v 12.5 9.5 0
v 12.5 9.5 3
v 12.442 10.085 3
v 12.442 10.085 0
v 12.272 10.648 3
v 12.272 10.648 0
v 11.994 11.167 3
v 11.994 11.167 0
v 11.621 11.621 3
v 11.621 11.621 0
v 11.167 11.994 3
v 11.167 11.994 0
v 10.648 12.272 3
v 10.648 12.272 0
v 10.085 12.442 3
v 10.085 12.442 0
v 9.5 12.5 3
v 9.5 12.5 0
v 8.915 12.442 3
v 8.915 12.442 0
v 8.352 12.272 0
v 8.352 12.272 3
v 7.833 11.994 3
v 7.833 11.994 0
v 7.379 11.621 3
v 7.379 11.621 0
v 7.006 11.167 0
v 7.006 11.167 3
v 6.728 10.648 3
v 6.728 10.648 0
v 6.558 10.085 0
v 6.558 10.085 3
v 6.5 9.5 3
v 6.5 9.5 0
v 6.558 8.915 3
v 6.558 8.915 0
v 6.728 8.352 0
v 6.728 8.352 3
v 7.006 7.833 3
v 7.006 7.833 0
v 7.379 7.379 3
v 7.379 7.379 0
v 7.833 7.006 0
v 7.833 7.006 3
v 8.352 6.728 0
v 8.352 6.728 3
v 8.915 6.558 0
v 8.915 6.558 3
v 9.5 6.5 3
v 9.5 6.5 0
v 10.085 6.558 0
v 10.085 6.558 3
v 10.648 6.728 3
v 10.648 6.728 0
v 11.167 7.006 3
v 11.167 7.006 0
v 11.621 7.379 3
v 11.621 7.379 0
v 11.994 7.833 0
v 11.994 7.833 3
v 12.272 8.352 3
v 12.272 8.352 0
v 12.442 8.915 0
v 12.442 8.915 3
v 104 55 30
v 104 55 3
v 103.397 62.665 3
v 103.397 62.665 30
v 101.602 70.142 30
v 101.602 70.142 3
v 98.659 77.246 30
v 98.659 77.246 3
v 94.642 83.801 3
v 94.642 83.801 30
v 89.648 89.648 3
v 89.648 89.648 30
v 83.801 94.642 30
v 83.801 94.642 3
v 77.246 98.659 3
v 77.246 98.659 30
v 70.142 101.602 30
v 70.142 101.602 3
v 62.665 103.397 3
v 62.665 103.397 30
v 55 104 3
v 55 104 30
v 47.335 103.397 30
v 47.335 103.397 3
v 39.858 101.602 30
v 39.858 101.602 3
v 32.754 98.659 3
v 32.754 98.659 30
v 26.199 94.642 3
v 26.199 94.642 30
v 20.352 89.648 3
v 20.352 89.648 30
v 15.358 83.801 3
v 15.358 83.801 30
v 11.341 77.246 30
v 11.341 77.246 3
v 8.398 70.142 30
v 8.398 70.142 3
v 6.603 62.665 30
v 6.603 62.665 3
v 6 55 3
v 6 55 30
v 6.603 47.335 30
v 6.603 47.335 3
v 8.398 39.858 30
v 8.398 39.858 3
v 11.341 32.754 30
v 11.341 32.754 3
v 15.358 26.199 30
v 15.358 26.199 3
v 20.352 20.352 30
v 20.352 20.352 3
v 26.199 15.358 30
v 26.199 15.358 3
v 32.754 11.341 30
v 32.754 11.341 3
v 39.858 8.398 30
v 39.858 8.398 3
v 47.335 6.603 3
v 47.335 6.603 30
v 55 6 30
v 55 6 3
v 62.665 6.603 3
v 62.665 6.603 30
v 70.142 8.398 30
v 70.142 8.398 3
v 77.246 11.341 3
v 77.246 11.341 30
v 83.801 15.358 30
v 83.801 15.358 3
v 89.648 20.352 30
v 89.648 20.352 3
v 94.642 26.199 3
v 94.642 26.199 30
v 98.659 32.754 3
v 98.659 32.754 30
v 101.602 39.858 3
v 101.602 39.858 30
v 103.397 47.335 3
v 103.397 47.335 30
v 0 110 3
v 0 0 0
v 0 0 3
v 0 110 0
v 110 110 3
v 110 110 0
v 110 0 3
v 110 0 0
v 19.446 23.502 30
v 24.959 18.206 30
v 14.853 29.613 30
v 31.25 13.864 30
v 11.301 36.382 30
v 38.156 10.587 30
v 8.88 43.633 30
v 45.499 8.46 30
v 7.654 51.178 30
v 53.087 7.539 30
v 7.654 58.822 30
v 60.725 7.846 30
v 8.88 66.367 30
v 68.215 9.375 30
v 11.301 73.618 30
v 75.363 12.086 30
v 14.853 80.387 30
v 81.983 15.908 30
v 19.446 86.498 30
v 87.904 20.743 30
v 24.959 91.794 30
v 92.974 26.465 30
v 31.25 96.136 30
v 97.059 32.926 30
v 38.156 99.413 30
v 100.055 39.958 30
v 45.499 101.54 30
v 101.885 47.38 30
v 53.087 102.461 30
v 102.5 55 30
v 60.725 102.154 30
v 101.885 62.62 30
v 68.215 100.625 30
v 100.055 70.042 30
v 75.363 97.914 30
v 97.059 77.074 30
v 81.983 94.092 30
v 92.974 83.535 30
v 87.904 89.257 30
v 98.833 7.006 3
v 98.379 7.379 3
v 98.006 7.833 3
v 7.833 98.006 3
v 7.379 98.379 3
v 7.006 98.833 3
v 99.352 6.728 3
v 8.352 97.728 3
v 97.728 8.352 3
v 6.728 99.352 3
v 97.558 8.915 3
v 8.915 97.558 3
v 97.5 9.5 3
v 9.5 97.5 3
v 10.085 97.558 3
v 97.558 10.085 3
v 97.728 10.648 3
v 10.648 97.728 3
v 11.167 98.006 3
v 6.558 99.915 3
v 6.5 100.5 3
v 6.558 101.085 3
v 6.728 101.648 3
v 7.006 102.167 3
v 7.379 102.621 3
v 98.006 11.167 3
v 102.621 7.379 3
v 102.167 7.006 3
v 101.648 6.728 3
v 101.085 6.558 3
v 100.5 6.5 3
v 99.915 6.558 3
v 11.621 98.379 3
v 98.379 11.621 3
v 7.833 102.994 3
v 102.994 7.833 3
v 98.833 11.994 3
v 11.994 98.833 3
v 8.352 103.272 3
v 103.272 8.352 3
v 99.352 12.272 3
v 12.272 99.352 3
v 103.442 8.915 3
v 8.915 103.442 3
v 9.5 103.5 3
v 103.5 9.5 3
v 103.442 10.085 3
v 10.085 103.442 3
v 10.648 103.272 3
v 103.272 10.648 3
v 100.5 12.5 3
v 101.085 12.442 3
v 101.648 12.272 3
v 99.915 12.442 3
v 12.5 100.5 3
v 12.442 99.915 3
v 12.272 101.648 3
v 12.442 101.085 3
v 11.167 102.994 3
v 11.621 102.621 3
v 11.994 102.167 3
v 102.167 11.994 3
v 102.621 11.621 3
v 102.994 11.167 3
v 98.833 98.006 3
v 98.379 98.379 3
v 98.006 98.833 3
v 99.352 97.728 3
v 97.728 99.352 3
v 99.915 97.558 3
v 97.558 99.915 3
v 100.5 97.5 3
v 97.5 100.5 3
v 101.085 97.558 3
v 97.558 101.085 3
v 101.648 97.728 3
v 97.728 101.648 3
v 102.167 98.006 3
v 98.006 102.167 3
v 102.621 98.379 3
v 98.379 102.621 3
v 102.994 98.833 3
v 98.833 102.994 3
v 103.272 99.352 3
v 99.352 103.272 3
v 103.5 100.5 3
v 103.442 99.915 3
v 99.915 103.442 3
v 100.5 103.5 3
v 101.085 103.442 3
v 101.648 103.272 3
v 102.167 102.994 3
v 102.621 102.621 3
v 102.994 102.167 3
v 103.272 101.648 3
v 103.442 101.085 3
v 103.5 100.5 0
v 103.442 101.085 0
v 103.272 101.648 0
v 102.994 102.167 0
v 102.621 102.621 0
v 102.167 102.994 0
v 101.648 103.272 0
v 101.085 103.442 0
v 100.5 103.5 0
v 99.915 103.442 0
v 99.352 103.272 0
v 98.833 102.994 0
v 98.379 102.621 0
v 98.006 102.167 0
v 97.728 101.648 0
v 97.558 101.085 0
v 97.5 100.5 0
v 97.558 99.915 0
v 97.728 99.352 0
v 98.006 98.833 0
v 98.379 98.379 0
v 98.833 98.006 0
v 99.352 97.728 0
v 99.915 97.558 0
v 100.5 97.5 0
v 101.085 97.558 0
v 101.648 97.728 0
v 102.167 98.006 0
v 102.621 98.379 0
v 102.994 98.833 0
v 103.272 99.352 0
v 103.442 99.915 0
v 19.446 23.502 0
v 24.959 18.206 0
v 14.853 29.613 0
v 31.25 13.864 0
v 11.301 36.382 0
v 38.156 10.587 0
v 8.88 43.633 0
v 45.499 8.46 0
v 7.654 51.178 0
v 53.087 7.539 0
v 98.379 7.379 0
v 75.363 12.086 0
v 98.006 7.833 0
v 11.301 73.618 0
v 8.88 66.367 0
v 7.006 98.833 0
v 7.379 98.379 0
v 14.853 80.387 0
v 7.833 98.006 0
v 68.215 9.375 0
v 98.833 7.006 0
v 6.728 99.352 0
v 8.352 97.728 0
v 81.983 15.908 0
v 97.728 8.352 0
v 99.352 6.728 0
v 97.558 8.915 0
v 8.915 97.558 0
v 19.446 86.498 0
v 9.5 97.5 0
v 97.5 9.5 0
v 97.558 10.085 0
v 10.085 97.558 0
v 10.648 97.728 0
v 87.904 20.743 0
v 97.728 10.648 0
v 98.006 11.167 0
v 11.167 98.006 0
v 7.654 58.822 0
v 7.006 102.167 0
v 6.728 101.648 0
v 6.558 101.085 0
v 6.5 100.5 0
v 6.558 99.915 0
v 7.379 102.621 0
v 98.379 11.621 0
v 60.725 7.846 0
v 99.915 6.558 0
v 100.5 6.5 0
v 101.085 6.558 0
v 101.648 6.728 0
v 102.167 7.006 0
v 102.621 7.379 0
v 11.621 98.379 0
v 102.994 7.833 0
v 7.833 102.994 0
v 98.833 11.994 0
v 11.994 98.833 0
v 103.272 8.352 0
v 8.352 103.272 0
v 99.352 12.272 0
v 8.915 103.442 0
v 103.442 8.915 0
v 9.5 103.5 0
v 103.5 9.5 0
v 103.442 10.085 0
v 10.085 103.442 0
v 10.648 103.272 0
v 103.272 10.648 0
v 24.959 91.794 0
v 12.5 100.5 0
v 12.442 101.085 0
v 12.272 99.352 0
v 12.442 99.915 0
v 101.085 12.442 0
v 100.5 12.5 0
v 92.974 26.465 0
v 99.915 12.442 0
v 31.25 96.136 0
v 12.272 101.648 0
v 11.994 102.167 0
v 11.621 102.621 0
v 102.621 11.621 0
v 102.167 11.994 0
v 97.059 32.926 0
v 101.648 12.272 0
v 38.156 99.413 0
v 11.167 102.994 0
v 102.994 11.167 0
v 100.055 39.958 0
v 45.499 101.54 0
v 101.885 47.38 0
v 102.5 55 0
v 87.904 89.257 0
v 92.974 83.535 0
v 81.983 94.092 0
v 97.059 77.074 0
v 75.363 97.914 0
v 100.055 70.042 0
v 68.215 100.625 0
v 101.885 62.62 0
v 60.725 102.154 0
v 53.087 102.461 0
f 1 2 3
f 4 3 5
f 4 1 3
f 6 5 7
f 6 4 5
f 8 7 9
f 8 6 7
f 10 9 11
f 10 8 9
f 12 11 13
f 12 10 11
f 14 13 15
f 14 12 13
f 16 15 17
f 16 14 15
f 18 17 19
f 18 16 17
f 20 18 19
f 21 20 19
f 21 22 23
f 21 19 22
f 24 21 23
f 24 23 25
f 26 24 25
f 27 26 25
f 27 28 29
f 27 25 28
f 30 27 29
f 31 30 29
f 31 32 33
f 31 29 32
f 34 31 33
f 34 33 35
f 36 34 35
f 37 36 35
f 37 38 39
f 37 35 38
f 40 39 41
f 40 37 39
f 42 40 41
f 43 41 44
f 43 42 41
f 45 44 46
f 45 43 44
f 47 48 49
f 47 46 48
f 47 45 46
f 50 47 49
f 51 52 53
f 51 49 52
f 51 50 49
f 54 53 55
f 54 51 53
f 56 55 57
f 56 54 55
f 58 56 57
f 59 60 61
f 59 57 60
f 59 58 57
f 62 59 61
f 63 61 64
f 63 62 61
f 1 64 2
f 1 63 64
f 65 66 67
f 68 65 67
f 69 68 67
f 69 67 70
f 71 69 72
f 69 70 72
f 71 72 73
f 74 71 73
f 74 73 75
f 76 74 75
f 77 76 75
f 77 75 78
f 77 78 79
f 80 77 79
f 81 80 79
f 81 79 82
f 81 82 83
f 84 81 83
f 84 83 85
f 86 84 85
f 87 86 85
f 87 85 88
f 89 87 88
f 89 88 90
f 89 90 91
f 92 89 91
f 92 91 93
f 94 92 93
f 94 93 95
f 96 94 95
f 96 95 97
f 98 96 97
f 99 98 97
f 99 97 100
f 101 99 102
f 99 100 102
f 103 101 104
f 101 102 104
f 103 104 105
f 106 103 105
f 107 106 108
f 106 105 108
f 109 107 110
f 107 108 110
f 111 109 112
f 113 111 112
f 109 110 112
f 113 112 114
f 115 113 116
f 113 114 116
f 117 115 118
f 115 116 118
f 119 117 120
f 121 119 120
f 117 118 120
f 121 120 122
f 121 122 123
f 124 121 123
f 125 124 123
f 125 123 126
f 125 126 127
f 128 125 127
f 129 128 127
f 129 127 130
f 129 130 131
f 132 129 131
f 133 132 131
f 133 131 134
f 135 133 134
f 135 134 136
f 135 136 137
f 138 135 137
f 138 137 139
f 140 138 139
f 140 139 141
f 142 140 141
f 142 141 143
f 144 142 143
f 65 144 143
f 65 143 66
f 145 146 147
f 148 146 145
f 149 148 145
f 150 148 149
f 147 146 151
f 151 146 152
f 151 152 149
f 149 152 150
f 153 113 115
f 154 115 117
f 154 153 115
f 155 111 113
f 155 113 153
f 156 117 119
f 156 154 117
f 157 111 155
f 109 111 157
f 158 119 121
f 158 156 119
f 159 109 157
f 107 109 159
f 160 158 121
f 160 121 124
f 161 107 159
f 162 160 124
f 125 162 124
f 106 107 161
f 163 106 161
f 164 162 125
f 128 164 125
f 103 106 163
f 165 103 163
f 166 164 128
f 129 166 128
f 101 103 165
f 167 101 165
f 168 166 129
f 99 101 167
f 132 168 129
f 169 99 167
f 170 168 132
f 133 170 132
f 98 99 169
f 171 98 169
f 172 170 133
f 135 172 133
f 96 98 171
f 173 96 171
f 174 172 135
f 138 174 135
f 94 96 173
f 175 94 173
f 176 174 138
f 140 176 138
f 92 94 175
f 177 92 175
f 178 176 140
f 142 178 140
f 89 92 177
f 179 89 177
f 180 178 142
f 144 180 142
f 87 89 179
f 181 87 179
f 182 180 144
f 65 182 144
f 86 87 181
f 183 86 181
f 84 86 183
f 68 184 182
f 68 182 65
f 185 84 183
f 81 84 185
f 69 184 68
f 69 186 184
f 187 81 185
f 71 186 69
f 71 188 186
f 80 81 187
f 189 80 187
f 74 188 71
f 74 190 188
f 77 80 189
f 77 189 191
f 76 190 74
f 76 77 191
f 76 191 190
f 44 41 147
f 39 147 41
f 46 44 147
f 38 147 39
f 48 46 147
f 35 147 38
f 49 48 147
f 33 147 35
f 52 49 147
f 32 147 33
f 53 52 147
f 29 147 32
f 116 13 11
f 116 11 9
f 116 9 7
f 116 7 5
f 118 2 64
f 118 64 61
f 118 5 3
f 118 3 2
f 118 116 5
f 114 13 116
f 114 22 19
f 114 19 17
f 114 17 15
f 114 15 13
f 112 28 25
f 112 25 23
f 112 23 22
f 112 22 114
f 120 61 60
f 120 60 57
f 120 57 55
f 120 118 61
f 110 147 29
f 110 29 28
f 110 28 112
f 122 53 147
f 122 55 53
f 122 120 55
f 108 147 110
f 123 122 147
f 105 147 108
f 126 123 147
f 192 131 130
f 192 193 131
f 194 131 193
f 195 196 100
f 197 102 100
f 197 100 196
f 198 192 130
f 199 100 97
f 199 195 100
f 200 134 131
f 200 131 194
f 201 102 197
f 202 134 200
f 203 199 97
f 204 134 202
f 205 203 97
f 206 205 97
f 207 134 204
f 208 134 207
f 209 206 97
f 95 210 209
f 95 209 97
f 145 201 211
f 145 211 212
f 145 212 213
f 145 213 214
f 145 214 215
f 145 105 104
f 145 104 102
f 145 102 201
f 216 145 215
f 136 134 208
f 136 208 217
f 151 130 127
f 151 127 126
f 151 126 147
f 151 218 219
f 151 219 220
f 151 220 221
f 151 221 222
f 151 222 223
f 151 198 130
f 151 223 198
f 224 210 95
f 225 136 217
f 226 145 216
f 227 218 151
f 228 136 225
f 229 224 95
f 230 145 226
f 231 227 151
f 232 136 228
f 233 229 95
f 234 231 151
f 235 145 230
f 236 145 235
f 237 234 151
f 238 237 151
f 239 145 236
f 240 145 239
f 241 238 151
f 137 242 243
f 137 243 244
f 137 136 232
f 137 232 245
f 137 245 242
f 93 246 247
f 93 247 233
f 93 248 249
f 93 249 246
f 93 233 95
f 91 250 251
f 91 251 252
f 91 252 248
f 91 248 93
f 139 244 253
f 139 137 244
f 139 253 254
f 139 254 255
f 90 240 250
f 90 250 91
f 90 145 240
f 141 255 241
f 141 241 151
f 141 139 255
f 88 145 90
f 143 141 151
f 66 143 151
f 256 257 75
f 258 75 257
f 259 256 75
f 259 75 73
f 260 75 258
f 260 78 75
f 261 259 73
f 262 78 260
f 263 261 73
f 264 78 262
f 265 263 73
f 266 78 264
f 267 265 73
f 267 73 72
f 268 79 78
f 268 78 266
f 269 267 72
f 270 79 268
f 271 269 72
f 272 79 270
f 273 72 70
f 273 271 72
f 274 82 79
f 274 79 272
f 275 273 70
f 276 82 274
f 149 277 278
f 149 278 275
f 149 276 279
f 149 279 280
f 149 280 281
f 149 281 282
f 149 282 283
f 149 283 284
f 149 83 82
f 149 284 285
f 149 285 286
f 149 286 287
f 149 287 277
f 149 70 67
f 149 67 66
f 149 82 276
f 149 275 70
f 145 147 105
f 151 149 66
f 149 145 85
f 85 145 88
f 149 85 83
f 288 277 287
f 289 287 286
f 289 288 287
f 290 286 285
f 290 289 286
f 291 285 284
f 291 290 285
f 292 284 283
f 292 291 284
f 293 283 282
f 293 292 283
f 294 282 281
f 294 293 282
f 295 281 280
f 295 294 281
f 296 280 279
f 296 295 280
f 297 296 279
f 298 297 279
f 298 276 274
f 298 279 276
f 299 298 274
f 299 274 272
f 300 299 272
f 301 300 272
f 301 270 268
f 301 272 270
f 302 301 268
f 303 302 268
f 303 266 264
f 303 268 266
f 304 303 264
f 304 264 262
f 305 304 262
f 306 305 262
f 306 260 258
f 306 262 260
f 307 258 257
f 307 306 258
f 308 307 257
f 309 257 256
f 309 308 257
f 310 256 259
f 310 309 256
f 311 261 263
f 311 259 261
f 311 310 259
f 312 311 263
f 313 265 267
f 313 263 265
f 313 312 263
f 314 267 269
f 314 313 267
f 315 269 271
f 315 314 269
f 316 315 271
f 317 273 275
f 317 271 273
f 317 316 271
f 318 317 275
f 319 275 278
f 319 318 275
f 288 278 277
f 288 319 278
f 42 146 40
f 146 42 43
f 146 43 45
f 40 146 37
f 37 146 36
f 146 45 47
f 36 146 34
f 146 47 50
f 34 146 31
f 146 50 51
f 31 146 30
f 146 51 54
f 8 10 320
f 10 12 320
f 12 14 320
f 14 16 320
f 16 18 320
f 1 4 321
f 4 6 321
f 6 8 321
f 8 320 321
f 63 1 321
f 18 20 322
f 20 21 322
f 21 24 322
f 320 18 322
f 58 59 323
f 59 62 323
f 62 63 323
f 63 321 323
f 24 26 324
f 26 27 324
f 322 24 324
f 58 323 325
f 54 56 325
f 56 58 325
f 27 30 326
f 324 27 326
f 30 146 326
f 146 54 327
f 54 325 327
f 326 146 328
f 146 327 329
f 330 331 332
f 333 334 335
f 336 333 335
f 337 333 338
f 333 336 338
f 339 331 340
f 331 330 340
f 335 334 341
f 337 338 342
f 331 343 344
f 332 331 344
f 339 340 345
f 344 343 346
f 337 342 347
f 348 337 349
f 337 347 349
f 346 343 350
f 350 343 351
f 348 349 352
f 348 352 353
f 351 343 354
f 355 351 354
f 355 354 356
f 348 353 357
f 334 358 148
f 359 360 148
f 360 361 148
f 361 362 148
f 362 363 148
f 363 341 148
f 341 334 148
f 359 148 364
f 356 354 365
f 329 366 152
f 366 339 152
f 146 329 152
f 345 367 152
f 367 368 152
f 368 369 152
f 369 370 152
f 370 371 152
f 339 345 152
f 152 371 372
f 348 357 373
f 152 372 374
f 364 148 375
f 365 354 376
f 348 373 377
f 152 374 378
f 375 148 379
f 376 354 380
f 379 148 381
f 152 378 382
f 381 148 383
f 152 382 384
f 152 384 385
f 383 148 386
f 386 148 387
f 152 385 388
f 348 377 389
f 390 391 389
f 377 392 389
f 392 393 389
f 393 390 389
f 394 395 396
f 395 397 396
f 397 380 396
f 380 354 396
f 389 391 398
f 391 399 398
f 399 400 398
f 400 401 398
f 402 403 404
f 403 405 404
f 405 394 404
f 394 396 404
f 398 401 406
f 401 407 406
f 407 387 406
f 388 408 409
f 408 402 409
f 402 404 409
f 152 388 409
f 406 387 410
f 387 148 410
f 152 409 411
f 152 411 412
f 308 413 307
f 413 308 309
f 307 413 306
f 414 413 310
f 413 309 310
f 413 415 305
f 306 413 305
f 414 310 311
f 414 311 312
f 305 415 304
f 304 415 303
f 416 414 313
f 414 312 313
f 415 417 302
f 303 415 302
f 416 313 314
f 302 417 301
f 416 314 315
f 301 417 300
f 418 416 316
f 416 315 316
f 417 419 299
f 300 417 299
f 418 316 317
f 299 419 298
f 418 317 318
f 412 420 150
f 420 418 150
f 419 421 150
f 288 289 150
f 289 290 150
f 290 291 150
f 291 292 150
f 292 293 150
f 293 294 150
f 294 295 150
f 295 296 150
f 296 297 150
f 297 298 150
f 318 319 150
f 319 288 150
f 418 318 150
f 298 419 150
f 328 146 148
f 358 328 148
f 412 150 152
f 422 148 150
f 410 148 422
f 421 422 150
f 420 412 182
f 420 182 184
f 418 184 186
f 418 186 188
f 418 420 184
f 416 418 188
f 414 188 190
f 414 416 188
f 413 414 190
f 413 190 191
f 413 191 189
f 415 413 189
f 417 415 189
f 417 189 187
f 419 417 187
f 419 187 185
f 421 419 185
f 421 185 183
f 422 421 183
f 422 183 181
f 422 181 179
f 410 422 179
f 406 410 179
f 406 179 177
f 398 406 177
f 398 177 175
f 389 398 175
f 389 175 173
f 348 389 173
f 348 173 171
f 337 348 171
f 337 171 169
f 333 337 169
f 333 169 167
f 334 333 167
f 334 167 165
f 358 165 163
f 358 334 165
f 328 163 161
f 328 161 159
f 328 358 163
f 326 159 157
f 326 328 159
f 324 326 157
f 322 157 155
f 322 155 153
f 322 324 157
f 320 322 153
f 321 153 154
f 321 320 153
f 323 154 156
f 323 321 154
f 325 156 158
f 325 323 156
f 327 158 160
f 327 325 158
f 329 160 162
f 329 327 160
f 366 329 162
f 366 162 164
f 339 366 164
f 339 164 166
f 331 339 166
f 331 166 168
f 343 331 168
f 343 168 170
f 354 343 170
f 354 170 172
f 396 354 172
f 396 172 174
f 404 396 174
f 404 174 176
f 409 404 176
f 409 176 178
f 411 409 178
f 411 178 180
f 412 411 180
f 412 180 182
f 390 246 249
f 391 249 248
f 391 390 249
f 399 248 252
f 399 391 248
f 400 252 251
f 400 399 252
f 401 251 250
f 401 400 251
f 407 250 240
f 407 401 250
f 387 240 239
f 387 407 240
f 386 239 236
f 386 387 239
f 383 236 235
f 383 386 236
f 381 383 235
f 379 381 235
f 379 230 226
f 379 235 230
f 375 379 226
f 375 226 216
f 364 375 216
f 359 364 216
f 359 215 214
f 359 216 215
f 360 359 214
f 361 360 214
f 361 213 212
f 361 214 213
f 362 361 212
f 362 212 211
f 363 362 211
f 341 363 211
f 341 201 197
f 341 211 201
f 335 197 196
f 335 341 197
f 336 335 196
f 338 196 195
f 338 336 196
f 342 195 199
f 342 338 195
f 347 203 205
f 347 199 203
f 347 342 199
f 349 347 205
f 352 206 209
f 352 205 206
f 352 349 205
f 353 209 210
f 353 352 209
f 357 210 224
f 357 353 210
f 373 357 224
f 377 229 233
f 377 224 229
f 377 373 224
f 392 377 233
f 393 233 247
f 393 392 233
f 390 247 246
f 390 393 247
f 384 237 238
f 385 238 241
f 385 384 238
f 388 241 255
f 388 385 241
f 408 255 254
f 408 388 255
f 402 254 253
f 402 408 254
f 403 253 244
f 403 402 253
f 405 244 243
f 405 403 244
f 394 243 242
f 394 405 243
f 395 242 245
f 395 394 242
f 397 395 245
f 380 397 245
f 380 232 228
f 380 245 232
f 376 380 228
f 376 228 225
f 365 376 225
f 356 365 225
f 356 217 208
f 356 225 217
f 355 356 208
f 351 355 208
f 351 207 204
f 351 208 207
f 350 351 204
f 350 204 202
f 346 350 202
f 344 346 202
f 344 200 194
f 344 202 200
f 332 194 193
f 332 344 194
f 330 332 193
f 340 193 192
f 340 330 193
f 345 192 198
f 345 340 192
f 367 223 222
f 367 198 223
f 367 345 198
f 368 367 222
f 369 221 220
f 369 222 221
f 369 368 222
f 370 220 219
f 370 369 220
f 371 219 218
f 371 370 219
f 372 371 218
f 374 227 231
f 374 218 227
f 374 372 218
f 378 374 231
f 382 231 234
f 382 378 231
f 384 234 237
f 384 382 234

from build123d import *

# Parameters (mm, degrees)
CYLINDER005_R     = 3
CYLINDER005_DEPTH = 10
CYLINDER004_R     = 3
CYLINDER004_DEPTH = 10
CYLINDER003_R     = 3
CYLINDER003_DEPTH = 10
CYLINDER002_R     = 3
CYLINDER002_DEPTH = 10
CYLINDER001_R     = 47.5
CYLINDER001_DEPTH = 30
BOX_W             = 110
BOX_H             = 110
BOX_DEPTH         = 3
CYLINDER_R        = 49
CYLINDER_DEPTH    = 30


with BuildPart() as cylinder005:
    # Cylinder005 → Cylinder005 (new body)
    with BuildSketch(Plane(origin=(100.5, 9.5, 0), x_dir=(1, 0, 0), z_dir=(0, 0, 1))):
        Circle(CYLINDER005_R)
    extrude(amount=CYLINDER005_DEPTH)


with BuildPart() as cylinder004:
    # Cylinder004 → Cylinder004 (new body)
    with BuildSketch(Plane(origin=(100.5, 100.5, 0), x_dir=(1, 0, 0), z_dir=(0, 0, 1))):
        Circle(CYLINDER004_R)
    extrude(amount=CYLINDER004_DEPTH)


with BuildPart() as cylinder003:
    # Cylinder003 → Cylinder003 (new body)
    with BuildSketch(Plane(origin=(9.5, 100.5, 0), x_dir=(1, 0, 0), z_dir=(0, 0, 1))):
        Circle(CYLINDER003_R)
    extrude(amount=CYLINDER003_DEPTH)


with BuildPart() as cylinder002:
    # Cylinder002 → Cylinder002 (new body)
    with BuildSketch(Plane(origin=(9.5, 9.5, 0), x_dir=(1, 0, 0), z_dir=(0, 0, 1))):
        Circle(CYLINDER002_R)
    extrude(amount=CYLINDER002_DEPTH)


with BuildPart() as cylinder001:
    # Cylinder001 → Cylinder001 (new body)
    with BuildSketch(Plane(origin=(55, 55, 0), x_dir=(1, 0, 0), z_dir=(0, 0, 1))):
        Circle(CYLINDER001_R)
    extrude(amount=CYLINDER001_DEPTH)


with BuildPart() as cut:
    # Box → Box (new body)
    with BuildSketch(Plane.XY):
        with Locations((55, 55)):
            Rectangle(BOX_W, BOX_H)
    extrude(amount=BOX_DEPTH)

    # Cut: cut Cylinder001
    add(cylinder001.part, mode=Mode.SUBTRACT)


with BuildPart() as cut005:
    # Cylinder → Cylinder (new body)
    with BuildSketch(Plane(origin=(55, 55, 0), x_dir=(1, 0, 0), z_dir=(0, 0, 1))):
        Circle(CYLINDER_R)
    extrude(amount=CYLINDER_DEPTH)

    # Cut001: cut Cylinder001
    add(cylinder001.part, mode=Mode.SUBTRACT)

    # Fusion: union Cut
    add(cut.part)

    # Cut002: cut Cylinder002
    add(cylinder002.part, mode=Mode.SUBTRACT)

    # Cut003: cut Cylinder003
    add(cylinder003.part, mode=Mode.SUBTRACT)

    # Cut004: cut Cylinder004
    add(cylinder004.part, mode=Mode.SUBTRACT)

    # Cut005: cut Cylinder005
    add(cylinder005.part, mode=Mode.SUBTRACT)


solid = cut005.part
